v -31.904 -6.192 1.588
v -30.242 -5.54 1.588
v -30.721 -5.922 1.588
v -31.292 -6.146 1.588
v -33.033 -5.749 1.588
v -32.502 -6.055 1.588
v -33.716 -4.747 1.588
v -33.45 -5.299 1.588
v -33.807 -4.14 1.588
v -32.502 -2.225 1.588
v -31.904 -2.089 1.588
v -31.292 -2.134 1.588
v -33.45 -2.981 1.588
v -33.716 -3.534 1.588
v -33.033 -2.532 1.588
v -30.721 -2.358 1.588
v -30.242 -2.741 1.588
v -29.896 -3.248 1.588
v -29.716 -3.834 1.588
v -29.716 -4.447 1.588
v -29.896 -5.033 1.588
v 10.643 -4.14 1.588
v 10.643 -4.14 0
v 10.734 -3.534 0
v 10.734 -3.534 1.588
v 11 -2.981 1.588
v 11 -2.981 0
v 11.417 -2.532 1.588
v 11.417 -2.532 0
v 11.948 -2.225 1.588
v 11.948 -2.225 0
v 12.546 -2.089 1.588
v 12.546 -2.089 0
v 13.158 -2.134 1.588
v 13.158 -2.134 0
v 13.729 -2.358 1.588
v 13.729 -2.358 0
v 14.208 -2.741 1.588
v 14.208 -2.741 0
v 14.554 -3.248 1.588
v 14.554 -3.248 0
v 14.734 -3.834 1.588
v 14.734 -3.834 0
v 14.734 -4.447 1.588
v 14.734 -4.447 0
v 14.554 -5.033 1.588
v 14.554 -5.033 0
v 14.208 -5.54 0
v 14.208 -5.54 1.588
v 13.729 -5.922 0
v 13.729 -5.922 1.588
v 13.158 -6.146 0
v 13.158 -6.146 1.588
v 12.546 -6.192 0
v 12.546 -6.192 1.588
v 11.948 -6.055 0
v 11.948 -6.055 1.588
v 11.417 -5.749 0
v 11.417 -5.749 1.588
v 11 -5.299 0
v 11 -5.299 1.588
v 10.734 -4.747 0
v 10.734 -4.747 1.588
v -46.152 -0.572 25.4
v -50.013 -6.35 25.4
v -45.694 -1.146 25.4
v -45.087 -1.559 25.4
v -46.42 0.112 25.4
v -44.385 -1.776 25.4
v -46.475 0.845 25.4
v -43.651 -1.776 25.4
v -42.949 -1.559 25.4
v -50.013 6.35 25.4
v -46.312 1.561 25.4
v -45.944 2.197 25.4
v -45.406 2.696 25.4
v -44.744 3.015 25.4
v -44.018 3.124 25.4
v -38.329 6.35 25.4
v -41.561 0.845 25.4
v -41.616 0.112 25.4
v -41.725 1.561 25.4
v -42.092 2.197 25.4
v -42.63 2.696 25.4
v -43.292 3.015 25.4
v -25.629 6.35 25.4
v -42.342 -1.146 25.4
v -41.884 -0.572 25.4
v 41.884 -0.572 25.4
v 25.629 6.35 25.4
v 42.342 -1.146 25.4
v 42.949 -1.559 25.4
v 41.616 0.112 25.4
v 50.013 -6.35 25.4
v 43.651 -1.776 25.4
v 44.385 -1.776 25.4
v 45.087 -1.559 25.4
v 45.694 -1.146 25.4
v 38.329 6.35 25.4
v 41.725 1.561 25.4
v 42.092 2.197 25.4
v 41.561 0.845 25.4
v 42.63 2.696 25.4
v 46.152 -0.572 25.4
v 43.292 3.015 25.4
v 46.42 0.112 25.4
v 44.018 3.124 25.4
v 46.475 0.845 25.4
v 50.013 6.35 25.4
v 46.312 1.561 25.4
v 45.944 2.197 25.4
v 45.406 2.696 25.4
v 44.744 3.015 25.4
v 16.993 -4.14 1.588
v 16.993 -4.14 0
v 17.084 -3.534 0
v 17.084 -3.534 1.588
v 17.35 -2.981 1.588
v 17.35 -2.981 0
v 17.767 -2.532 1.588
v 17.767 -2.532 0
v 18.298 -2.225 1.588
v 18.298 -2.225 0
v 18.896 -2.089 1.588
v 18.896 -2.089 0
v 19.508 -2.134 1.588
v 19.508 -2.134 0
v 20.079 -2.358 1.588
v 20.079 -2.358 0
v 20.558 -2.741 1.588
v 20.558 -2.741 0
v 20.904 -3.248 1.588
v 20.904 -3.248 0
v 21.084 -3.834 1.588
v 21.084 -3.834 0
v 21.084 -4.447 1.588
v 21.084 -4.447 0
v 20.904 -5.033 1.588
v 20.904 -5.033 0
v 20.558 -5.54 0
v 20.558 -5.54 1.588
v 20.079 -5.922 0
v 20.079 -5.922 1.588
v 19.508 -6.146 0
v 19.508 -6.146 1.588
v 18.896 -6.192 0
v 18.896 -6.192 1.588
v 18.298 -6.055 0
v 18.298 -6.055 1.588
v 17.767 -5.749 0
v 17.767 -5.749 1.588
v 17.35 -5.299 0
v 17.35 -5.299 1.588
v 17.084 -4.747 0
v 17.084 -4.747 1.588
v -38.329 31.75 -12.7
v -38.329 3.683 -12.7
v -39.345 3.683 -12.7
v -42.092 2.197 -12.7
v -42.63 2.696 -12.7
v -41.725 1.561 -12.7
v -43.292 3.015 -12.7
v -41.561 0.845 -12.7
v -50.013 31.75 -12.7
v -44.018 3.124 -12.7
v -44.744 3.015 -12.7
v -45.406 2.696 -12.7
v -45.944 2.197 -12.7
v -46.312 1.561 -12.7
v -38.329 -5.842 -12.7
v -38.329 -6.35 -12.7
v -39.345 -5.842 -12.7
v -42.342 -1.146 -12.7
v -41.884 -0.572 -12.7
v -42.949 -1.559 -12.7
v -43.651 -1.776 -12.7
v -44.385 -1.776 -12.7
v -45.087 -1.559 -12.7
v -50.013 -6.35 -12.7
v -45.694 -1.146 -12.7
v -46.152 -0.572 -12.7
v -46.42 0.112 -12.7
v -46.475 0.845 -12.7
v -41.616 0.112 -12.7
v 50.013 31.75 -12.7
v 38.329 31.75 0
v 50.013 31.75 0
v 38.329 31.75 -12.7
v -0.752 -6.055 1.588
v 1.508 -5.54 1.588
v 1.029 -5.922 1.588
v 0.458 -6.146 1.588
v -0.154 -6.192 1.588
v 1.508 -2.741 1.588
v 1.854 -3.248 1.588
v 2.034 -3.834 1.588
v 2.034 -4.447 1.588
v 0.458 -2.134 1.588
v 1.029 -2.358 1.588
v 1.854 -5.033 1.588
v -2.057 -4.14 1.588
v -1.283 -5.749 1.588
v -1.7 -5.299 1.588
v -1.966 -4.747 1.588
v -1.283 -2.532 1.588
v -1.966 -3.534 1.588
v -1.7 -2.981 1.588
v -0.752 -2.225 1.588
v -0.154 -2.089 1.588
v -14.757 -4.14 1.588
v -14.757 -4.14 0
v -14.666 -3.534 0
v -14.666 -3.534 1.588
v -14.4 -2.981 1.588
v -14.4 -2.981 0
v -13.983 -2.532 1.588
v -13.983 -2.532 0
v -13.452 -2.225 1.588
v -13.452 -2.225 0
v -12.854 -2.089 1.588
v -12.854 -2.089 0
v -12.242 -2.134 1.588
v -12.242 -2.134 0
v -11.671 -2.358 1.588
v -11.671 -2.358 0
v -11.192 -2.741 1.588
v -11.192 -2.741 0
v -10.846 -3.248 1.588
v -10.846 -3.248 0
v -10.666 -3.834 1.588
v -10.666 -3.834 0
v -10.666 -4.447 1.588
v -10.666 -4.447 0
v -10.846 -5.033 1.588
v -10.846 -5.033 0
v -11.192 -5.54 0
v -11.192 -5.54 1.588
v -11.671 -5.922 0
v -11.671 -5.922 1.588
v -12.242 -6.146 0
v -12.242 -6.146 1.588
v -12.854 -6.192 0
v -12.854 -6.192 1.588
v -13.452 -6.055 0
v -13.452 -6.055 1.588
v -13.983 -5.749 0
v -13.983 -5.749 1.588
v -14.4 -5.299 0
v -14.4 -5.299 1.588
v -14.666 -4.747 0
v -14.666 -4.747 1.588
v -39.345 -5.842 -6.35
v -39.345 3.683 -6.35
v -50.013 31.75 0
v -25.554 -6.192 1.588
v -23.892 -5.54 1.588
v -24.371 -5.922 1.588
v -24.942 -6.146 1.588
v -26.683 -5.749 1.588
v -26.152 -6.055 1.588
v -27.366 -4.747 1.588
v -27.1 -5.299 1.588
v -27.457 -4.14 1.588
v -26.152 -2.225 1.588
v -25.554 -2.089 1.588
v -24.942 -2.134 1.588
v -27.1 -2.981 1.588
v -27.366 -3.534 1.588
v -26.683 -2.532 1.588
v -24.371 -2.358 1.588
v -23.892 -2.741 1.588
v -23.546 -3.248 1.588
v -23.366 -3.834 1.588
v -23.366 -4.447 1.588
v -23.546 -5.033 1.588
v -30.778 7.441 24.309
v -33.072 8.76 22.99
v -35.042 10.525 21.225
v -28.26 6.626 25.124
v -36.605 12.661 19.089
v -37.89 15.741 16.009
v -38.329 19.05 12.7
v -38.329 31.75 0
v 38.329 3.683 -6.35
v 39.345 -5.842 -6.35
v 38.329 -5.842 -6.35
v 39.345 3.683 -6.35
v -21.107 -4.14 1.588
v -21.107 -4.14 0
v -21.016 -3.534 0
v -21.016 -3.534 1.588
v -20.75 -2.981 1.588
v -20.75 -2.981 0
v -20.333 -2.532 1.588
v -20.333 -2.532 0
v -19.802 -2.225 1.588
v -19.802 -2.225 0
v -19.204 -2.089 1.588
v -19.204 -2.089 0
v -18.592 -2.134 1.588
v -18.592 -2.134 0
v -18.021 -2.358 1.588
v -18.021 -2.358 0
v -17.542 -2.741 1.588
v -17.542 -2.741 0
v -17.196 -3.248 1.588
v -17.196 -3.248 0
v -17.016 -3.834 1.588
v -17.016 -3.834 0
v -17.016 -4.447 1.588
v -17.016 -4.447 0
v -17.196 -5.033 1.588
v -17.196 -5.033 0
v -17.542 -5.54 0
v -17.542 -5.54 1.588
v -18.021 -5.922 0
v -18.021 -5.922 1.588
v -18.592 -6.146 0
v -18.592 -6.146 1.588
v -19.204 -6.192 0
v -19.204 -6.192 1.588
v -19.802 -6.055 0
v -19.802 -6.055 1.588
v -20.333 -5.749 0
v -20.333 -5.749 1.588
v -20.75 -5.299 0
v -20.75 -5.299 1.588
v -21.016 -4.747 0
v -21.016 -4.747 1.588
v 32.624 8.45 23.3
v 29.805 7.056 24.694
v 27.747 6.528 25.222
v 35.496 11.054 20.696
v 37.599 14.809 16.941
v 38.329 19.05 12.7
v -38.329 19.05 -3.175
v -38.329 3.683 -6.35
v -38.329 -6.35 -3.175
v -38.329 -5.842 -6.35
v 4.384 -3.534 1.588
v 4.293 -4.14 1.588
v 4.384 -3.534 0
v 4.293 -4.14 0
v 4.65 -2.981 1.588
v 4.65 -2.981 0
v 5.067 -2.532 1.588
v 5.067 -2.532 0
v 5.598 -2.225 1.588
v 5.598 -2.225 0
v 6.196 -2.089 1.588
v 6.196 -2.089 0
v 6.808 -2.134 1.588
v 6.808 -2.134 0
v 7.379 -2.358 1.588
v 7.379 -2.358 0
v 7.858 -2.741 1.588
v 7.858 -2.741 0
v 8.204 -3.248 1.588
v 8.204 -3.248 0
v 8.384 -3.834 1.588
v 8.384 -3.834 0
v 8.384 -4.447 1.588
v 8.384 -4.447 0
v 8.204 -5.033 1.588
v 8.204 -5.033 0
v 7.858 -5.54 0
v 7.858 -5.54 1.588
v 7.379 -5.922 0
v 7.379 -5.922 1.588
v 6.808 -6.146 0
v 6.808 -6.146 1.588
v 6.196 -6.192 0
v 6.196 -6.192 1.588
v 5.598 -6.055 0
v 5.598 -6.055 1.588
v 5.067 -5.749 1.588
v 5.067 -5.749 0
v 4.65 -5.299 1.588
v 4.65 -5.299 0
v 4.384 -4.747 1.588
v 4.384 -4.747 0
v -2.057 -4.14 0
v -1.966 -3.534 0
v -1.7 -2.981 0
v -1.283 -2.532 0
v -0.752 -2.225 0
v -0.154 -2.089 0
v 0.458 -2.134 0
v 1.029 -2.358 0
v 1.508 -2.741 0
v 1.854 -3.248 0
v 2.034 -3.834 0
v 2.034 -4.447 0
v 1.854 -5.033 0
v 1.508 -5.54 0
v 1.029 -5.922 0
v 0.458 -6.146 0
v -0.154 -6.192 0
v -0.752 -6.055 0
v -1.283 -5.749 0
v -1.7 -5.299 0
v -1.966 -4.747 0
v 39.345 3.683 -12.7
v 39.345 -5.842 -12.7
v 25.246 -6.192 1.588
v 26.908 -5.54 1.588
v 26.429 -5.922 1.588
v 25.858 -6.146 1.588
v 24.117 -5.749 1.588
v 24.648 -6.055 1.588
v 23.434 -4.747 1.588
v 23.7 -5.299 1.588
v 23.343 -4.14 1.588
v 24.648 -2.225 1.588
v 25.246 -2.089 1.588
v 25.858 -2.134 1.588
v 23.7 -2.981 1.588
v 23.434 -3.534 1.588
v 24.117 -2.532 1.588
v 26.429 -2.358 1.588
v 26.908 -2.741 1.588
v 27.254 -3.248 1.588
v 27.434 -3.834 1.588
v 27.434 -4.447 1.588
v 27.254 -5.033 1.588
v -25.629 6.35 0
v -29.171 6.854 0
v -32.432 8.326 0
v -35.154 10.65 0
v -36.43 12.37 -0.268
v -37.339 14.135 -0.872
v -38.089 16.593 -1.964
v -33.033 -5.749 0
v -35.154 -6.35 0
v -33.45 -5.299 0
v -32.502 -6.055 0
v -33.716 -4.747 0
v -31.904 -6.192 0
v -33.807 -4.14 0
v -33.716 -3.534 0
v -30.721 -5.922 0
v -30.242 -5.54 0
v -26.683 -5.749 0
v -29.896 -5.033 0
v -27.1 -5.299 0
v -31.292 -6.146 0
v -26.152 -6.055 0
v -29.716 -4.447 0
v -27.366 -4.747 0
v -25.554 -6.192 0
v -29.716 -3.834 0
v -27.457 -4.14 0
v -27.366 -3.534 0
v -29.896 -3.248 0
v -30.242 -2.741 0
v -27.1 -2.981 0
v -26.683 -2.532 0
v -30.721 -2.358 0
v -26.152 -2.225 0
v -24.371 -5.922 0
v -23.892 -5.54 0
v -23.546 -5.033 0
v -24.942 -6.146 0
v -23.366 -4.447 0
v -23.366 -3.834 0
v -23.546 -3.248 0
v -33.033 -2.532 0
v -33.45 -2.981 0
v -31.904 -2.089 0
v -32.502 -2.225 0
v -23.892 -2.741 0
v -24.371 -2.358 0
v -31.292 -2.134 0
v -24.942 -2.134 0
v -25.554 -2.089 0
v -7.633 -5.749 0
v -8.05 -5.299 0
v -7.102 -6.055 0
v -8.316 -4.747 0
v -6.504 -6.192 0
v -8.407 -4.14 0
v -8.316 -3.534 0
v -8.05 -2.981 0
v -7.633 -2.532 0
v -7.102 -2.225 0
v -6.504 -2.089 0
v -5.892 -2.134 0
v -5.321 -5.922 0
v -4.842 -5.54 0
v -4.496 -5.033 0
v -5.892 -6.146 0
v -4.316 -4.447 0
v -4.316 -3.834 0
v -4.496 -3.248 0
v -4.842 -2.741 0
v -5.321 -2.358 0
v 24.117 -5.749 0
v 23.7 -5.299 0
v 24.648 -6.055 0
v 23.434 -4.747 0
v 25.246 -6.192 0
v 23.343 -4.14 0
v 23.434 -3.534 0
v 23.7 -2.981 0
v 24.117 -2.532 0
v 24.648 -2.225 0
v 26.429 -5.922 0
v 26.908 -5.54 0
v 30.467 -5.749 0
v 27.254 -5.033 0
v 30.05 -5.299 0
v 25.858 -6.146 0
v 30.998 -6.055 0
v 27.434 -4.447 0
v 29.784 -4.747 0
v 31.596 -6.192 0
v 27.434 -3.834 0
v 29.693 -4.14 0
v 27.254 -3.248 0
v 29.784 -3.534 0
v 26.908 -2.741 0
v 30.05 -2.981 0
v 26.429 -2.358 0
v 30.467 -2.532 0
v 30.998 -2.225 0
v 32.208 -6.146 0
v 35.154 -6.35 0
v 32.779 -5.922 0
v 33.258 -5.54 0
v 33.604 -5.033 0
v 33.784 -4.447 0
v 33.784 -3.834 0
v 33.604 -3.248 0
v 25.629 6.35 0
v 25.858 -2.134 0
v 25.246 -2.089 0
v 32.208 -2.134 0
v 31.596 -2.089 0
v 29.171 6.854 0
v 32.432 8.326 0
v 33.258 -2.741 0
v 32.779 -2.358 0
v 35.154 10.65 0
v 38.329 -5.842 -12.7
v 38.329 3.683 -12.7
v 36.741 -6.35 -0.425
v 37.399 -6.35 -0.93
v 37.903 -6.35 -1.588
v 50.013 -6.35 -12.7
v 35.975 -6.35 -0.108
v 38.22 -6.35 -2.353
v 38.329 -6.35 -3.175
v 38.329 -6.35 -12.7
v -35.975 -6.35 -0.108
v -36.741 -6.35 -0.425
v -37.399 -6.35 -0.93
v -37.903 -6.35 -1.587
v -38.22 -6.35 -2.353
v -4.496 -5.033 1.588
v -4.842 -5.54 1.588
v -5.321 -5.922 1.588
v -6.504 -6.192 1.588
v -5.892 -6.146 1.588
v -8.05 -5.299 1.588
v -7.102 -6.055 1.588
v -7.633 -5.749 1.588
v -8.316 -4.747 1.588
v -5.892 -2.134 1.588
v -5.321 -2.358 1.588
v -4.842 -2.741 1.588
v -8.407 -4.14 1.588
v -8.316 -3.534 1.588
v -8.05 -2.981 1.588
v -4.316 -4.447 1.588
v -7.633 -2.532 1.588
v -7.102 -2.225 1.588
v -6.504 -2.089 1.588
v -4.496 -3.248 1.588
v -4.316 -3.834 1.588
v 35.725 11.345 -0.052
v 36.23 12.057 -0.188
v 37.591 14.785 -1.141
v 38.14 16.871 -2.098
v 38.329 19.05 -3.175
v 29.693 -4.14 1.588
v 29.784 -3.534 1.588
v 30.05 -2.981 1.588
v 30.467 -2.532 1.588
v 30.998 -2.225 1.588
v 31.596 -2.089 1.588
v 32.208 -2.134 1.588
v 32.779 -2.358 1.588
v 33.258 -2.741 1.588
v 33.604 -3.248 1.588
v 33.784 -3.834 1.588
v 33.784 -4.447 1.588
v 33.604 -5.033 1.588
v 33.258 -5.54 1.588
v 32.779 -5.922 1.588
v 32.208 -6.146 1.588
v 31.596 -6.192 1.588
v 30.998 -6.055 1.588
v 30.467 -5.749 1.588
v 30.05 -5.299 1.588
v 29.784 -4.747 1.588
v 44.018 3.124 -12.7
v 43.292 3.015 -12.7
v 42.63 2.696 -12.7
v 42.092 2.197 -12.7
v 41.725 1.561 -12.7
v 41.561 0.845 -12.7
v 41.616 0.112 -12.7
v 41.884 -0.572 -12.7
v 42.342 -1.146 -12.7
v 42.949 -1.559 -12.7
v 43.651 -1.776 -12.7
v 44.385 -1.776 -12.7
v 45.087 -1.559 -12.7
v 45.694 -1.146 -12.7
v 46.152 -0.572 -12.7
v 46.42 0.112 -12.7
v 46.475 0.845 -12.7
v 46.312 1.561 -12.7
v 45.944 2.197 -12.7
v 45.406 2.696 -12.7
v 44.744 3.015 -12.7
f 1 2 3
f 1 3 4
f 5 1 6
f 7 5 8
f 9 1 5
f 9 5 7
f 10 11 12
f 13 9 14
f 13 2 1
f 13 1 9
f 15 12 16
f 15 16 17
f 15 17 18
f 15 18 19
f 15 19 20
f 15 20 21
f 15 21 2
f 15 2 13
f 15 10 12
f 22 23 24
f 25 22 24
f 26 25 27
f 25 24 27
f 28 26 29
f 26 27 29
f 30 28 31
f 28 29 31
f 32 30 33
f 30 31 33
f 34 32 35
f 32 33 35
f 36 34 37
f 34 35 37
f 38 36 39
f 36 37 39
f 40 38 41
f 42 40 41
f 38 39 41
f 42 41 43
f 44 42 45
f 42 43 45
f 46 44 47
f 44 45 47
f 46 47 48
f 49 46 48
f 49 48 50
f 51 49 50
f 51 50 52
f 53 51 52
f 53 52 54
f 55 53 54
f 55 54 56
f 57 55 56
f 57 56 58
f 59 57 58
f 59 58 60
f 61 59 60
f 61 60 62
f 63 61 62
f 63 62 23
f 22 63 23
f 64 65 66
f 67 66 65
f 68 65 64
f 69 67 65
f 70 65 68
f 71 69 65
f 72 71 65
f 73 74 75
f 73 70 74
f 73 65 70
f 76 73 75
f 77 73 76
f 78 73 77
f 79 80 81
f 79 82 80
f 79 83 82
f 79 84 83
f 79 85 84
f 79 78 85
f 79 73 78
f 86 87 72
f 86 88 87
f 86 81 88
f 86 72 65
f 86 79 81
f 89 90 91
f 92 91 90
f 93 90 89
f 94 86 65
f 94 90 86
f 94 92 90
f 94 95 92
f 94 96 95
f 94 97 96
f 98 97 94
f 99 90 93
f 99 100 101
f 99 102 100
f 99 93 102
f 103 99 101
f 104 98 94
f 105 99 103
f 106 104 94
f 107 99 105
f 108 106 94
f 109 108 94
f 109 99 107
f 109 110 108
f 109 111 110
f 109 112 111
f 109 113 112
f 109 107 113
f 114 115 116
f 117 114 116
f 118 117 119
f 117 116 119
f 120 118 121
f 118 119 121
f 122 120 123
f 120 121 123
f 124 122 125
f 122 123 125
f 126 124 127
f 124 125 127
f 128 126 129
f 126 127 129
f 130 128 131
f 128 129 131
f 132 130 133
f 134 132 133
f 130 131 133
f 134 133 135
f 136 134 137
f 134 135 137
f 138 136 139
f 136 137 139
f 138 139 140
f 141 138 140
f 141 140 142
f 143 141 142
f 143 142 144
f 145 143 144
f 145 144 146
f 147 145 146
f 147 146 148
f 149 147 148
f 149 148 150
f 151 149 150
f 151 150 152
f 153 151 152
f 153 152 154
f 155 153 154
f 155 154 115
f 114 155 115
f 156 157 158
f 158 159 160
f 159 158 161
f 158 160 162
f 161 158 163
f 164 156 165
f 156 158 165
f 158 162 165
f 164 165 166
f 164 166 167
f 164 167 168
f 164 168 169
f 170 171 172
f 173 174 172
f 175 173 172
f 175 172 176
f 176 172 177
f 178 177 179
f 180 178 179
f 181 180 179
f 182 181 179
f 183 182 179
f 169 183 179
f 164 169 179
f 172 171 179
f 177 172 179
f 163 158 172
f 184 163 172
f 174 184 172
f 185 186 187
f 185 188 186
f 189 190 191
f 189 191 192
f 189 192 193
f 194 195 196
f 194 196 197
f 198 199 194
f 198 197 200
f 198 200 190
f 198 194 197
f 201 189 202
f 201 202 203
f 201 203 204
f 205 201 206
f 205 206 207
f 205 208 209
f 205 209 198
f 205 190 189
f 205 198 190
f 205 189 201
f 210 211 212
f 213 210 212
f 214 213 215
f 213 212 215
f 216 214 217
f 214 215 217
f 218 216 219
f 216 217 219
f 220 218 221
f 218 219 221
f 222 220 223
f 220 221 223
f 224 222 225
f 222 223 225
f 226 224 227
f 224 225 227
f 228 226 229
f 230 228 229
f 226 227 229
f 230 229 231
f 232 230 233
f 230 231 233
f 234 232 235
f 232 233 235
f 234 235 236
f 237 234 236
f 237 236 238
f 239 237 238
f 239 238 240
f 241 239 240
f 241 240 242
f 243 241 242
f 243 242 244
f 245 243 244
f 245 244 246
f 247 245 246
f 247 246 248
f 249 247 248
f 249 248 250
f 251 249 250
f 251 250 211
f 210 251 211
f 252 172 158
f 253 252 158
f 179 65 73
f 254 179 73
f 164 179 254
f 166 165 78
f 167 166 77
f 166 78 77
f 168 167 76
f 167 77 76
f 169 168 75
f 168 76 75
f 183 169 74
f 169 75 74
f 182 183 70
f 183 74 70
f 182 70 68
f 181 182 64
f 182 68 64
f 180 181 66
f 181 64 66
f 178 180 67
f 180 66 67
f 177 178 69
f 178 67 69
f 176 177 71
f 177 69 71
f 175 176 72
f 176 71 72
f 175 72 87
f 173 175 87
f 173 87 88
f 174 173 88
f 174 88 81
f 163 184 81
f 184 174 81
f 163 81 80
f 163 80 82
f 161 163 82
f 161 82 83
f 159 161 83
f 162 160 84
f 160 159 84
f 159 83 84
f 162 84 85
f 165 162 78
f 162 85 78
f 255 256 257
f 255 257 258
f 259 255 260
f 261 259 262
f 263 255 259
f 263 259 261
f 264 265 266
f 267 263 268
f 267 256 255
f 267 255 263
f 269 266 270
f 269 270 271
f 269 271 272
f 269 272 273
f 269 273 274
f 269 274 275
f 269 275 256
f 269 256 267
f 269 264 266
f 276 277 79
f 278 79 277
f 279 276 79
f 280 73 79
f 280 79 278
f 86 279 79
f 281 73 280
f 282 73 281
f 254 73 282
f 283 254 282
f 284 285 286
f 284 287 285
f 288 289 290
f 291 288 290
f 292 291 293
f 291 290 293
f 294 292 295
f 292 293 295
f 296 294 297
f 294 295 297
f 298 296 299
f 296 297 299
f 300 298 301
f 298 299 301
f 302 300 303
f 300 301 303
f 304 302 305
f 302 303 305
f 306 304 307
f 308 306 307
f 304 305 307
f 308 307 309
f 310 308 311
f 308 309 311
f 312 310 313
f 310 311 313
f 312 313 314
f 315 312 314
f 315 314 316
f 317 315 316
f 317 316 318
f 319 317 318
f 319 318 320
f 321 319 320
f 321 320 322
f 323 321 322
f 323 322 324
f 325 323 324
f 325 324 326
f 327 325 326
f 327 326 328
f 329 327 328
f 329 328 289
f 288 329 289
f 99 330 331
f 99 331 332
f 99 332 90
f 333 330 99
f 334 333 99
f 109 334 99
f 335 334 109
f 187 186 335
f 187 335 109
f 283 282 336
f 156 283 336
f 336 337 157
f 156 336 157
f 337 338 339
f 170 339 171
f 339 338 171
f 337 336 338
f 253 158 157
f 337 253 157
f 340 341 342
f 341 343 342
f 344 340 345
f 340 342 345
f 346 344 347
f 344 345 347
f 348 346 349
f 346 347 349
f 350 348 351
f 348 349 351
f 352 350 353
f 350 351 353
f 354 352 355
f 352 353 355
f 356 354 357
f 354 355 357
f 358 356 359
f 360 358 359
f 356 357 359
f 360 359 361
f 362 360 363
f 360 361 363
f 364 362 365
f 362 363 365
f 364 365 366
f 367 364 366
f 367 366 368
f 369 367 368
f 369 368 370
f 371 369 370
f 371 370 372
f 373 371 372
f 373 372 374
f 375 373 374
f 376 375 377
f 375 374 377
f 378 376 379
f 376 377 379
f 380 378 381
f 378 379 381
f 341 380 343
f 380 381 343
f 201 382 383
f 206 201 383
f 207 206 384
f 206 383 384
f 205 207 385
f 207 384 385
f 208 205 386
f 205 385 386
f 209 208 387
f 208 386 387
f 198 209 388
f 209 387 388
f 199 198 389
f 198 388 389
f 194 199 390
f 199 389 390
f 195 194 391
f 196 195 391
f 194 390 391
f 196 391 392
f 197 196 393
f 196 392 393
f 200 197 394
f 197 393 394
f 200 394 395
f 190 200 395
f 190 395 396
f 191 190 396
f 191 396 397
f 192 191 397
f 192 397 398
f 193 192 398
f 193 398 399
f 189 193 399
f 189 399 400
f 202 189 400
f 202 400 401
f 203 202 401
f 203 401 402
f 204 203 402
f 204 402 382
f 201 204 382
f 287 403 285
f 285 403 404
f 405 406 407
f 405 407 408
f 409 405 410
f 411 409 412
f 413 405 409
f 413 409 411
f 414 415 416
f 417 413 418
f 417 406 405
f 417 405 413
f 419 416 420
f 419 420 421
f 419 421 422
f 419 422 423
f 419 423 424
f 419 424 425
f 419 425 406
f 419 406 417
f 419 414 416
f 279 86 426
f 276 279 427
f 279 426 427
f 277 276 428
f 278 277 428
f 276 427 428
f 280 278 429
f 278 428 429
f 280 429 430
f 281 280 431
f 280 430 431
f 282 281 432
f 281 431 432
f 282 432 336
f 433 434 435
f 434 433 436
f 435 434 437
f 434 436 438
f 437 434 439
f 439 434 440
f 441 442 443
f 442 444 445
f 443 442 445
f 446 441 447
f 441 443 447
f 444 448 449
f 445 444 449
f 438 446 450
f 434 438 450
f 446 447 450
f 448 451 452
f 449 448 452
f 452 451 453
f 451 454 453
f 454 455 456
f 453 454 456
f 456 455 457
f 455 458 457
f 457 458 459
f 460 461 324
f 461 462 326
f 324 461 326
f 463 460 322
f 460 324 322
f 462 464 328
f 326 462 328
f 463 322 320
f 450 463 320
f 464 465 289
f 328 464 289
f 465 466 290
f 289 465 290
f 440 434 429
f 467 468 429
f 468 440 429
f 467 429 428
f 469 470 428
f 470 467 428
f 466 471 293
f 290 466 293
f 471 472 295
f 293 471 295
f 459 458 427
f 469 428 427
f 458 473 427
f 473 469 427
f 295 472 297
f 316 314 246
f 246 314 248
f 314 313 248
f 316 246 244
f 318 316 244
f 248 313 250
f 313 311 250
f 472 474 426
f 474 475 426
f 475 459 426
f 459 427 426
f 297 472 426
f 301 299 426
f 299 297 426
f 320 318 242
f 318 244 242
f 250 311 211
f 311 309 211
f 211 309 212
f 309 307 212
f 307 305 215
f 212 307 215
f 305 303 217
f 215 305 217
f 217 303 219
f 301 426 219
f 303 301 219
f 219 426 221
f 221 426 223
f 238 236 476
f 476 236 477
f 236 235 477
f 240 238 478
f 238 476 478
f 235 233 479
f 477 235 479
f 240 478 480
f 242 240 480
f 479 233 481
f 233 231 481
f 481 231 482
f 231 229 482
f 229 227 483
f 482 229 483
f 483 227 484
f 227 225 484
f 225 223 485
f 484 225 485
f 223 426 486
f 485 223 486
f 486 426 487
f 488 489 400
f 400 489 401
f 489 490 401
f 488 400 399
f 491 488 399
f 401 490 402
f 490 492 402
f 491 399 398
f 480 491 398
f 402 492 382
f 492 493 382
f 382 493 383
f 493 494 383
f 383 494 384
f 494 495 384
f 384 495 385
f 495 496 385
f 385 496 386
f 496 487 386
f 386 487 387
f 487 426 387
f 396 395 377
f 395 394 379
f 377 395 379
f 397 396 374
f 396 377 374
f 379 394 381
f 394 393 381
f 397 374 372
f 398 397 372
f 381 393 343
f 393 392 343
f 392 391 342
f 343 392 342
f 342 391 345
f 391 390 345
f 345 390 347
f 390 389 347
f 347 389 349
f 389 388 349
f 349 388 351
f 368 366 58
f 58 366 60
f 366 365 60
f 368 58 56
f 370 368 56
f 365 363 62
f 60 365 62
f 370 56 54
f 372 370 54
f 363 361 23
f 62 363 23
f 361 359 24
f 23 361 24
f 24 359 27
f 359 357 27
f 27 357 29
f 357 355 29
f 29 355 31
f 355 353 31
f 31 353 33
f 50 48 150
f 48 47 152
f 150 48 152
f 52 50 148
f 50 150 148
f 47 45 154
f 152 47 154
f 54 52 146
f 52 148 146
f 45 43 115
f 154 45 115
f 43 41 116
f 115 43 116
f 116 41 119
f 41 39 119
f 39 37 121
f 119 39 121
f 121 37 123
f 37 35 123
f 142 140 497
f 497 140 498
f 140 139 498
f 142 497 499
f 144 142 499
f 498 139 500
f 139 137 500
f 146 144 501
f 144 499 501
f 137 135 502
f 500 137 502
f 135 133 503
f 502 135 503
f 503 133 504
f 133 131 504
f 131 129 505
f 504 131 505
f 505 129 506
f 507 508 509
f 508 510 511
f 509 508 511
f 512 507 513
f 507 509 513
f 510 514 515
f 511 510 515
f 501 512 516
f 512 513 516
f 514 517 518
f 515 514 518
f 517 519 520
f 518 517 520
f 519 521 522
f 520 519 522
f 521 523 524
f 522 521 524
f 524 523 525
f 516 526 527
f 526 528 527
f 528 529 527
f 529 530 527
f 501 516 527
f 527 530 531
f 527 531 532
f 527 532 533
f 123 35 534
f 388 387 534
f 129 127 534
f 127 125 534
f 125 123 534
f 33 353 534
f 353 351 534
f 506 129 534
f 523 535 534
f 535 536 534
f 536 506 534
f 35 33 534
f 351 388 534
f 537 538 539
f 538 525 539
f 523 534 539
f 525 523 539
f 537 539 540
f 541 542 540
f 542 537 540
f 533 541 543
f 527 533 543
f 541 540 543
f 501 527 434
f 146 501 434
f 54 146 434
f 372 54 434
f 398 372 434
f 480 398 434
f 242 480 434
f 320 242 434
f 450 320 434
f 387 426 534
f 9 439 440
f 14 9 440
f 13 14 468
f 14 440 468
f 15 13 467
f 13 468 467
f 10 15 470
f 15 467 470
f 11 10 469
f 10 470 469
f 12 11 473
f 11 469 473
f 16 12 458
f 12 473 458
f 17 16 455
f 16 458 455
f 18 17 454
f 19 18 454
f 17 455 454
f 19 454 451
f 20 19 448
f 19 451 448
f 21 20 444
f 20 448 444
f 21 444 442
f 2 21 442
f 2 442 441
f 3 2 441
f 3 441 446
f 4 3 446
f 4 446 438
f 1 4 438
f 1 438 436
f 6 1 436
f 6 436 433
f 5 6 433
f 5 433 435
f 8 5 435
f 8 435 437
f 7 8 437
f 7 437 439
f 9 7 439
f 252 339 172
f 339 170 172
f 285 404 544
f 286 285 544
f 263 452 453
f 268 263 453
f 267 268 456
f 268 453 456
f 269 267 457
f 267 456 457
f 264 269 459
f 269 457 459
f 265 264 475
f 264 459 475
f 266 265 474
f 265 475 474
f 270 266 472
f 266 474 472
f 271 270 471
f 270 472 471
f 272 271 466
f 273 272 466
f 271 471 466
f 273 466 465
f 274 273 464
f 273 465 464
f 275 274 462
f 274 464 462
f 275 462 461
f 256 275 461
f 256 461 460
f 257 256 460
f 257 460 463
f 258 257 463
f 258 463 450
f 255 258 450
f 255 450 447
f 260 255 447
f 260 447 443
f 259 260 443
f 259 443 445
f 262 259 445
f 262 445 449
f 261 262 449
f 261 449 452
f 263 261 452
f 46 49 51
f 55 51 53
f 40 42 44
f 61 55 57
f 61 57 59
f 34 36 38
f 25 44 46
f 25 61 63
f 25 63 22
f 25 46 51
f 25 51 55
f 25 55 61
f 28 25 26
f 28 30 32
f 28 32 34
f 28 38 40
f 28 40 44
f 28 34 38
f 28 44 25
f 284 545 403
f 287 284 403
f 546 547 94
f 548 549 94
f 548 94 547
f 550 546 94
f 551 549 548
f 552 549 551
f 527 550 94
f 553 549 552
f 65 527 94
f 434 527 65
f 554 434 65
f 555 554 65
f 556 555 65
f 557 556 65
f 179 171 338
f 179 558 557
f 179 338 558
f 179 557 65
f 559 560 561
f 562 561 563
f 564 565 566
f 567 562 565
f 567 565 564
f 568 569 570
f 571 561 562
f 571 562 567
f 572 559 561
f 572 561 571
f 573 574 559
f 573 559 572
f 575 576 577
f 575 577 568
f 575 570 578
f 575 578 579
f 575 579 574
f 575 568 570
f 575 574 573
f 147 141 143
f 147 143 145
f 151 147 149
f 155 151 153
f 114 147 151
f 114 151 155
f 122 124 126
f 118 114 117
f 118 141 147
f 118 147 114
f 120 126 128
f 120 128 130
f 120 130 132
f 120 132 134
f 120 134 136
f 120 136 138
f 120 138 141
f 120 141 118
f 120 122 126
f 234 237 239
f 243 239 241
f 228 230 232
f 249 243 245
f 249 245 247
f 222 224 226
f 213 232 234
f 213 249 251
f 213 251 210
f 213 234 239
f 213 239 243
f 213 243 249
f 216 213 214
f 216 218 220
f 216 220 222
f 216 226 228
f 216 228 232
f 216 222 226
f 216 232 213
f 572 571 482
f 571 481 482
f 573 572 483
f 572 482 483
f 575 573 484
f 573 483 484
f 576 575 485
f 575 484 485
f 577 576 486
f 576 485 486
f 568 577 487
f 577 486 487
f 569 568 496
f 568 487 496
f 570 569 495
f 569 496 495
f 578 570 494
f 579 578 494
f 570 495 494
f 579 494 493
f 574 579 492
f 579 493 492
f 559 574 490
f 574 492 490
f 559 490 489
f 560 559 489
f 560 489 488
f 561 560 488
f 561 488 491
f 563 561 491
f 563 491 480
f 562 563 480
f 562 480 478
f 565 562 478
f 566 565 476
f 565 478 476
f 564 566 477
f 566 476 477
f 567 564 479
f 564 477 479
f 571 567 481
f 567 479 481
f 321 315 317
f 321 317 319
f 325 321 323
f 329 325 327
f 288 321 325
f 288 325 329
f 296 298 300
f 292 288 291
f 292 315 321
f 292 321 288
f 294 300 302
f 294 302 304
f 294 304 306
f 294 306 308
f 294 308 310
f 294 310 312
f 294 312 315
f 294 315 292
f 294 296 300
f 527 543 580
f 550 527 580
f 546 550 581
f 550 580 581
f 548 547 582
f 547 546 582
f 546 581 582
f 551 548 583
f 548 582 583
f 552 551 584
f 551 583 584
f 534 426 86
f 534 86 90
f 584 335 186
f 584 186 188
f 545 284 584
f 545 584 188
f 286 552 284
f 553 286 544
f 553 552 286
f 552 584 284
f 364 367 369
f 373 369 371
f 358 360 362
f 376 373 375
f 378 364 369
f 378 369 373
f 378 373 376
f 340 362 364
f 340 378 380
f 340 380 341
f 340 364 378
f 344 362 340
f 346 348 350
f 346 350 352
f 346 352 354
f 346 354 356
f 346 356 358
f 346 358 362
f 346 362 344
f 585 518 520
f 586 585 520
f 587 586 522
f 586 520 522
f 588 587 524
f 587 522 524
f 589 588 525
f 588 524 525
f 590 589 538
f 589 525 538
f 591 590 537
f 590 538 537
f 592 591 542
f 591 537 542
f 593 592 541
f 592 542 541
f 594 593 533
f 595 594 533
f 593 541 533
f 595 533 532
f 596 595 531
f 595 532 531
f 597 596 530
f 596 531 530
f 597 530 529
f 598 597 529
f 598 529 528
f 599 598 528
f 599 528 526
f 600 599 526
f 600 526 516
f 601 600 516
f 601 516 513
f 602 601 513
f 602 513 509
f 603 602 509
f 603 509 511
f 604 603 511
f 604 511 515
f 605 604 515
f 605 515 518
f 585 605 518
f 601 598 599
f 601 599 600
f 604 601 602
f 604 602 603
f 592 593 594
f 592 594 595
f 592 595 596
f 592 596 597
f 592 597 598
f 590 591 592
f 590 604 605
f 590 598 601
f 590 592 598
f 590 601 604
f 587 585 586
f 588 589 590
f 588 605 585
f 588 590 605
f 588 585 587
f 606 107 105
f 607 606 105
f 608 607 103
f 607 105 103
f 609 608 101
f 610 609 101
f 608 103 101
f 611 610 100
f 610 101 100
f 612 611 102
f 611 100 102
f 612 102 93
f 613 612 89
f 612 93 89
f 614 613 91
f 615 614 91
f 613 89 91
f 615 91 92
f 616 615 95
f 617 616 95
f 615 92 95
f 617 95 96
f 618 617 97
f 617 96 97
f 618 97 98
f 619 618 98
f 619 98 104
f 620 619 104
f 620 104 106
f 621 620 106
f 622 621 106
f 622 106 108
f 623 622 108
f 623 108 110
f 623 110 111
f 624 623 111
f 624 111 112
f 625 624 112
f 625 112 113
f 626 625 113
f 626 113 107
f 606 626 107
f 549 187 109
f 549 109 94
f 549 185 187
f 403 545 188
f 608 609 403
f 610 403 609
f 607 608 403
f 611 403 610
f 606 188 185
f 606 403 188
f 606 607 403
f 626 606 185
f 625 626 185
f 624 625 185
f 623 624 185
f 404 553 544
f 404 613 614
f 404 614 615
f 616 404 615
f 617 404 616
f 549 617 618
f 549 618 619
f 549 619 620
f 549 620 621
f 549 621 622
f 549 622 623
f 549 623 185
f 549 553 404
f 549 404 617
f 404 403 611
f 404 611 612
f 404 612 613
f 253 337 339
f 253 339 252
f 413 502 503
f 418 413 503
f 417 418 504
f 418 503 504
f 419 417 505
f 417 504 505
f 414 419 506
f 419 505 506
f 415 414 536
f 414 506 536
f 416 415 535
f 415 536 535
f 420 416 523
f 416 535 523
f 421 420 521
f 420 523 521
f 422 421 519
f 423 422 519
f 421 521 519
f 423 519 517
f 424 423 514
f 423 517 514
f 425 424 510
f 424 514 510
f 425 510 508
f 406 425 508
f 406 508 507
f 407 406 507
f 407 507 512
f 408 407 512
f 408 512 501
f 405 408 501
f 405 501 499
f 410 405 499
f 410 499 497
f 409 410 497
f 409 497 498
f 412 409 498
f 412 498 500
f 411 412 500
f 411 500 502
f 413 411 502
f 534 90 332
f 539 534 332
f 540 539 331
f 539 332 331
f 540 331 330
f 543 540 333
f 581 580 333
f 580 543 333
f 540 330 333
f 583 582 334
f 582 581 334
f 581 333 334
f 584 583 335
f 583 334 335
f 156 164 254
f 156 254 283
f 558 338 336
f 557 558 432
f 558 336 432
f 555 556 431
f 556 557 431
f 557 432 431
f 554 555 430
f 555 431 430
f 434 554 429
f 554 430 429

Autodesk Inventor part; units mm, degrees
ref_plane "YZ Plane" through (0, 0, 0) normal (1, 0, 0) x (0, 1, 0)
ref_plane "XZ Plane" through (0, 0, 0) normal (0, 1, 0) x (-1, 0, 0)
ref_plane "XY Plane" through (0, 0, 0) normal (0, 0, 1) x (1, 0, 0)
sketch "Sketch1" plane through (0, 0, 0) normal (0, 0, 1) x (1, 0, 0)
  line L0 (-50.0126, 6.35) -> (50.0126, 6.35)
  line L1 (50.0126, 6.35) -> (50.0126, -6.35)
  line L2 (50.0126, -6.35) -> (-50.0126, -6.35)
  line L3 (-50.0126, -6.35) -> (-50.0126, 6.35)
  line L4 (-50.0126, 6.35) -> (50.0126, -6.35) construction
  line L5 (50.0126, 6.35) -> (-50.0126, -6.35) construction
  point P0 (0, 0)
  dimension "d0" = 100.0252
  dimension "d1" = 12.7
extrude "Extrusion1" add sketch "Sketch1" along normal blind 25.4
sketch "Sketch2" plane through (0, 0, 0) normal (0, 0, 1) x (1, 0, 0)
  line L0 (-50.0126, -6.35) -> (50.0126, -6.35) projected
  line L1 (-50.0126, 6.35) -> (-50.0126, -6.35) projected
  line L2 (50.0126, 6.35) -> (-50.0126, 6.35) projected
  line L3 (50.0126, -6.35) -> (50.0126, 6.35) projected
  line L4 (-70.0176, 0) -> (70.0176, 0) projected
  line L5 (0, -8.89) -> (0, 8.89) projected
  line L6 (50.0126, -6.35) -> (50.0126, 6.35) projected
  line L7 (-50.0126, -6.35) -> (50.0126, -6.35) projected
  line L8 (50.0126, 6.35) -> (38.3286, 6.35)
  line L9 (38.3286, 6.35) -> (38.3286, -6.35)
  line L10 (38.3286, -6.35) -> (50.0126, -6.35)
  line L11 (50.0126, -6.35) -> (50.0126, 6.35)
  point P0 (0, 0)
  point P1 (38.3286, 6.35)
  point P2 (38.3286, -6.35)
  dimension "d4" = 11.684
extrude "Extrusion2" add sketch "Sketch2" against normal blind 12.7 contours L9 L4 L3 L0 | L9 L2 L3 L4
mirror "Mirror1" about plane through (0, 0, 0) normal (1, 0, 0) of "Extrusion2"
fillet "Fillet1" radius 3.175 2 edges at (38.3286, 0, 0) (-38.3286, 0, 0)
sketch "Sketch3" plane through (0, 0, 0) normal (0, 0, -1) x (-1, 0, 0)
  line L0 (70.0176, 0) -> (-70.0176, 0) projected
  line L1 (0, -8.89) -> (0, 8.89) projected
  line L2 (35.1536, 6.35) -> (35.1536, -6.35) projected
  line L3 (-35.1536, 6.35) -> (35.1536, 6.35) projected
  line L4 (-35.1536, -6.35) -> (-35.1536, 6.35) projected
  line L5 (35.1536, -6.35) -> (-35.1536, -6.35) projected
  circle A0 centre (0, -4.1402) radius 2.0574
  point P0 (0, 0)
  dimension "d9" = 4.1148
  dimension "d10" = 2.2098
extrude "Extrusion3" cut sketch "Sketch3" against normal blind 1.5875 contours A0 L1 | L1 A0
pattern_linear "Rectangular Pattern1" count 11 spacing 6.35 along (1, 0, 0) of "Extrusion3" first direction both ways yes
sketch "Sketch4" plane through (0, 0, -12.7) normal (0, 0, -1) x (-1, 0, 0)
  line L0 (70.0176, 0) -> (-70.0176, 0) projected
  line L1 (0, -8.89) -> (0, 8.89) projected
  line L2 (-50.0126, -6.35) -> (-38.3286, -6.35) projected
  line L3 (-38.3286, -6.35) -> (-38.3286, 6.35) projected
  line L4 (-38.3286, 6.35) -> (-50.0126, 6.35) projected
  line L5 (-50.0126, 6.35) -> (-50.0126, -6.35) projected
  line L6 (50.0126, -6.35) -> (38.3286, -6.35) projected
  line L7 (50.0126, 6.35) -> (50.0126, -6.35) projected
  line L8 (38.3286, 6.35) -> (50.0126, 6.35) projected
  line L9 (38.3286, -6.35) -> (38.3286, 6.35) projected
  line L10 (-38.3286, -6.35) -> (-38.3286, 6.35) projected
  line L11 (-38.3286, 3.683) -> (-39.3446, 3.683)
  line L12 (-39.3446, 3.683) -> (-39.3446, -5.842)
  line L13 (-39.3446, -5.842) -> (-38.3286, -5.842)
  line L14 (-38.3286, -5.842) -> (-38.3286, 3.683)
  point P0 (0, 0)
  point P1 (-38.3286, 3.683)
  dimension "d19" = 1.016
  dimension "d20" = 9.525
  dimension "d21" = 0.508
extrude "Extrusion4" cut sketch "Sketch4" against normal blind 6.35 contours L3 L13 L12 L0 | L0 L12 L11 L3
mirror "Mirror2" about plane through (0, 0, 0) normal (1, 0, 0) of "Extrusion4"
sketch "Sketch5" plane through (0, 0, -12.7) normal (0, 0, -1) x (-1, 0, 0)
  line L0 (-38.3286, -5.842) -> (-39.3446, -5.842) projected
  line L1 (-39.3446, -5.842) -> (-39.3446, 3.683) projected
  line L2 (-39.3446, 3.683) -> (-38.3286, 3.683) projected
  line L3 (-38.3286, 3.683) -> (-38.3286, 6.35) projected
  line L4 (-38.3286, 6.35) -> (-50.0126, 6.35) projected
  line L5 (-50.0126, 6.35) -> (-50.0126, -6.35) projected
  line L6 (-50.0126, -6.35) -> (-38.3286, -6.35) projected
  line L7 (-38.3286, -6.35) -> (-38.3286, -5.842) projected
  line L8 (47.9806, -6.35) -> (47.9806, 6.35) projected
  line L9 (50.0126, 6.35) -> (50.0126, -6.35) projected
  line L10 (38.3286, 3.683) -> (39.3446, 3.683) projected
  line L11 (39.3446, 3.683) -> (39.3446, -5.842) projected
  line L12 (39.3446, -5.842) -> (38.3286, -5.842) projected
  line L13 (38.3286, -6.35) -> (38.3286, -5.842) projected
  line L14 (50.0126, -6.35) -> (38.3286, -6.35) projected
  line L15 (50.0126, 6.35) -> (50.0126, -6.35) projected
  line L16 (38.3286, 6.35) -> (50.0126, 6.35) projected
  line L17 (38.3286, 3.683) -> (38.3286, 6.35) projected
  line L18 (70.0176, 0) -> (-70.0176, 0) projected
  line L19 (0, -8.89) -> (0, 8.89) projected
  circle A0 centre (-44.0182, 0.6604) radius 3.3782
  point P0 (0, 0)
  dimension "d24" = 6.7564
  dimension "d25" = 7.0104
  dimension "d26" = 5.9944
hole "Hole1" at (44.0182, 0.6604, -12.7) direction (0, 0, 1) diameter 4.9276 end through all clearance for "Socket Head Cap Screw" size "#8" standard "Ansi Unified Screw Threads"
mirror "Mirror3" about plane through (0, 0, 0) normal (1, 0, 0) of "Hole1"
sketch "Sketch6" plane through (38.3286, 6.35, -12.7) normal (0, 1, 0) x (1, 0, 0)
  line L0 (11.684, -38.1) -> (-88.3412, -38.1) projected
  line L1 (11.684, 0) -> (11.684, -38.1) projected
  line L2 (0, 0) -> (11.684, 0) projected
  line L3 (0, -9.525) -> (0, 0) projected
  arc A0 (-3.175, -12.7) -> (0, -9.525) centre (-3.175, -9.525) ccw projected
  line L4 (-3.175, -12.7) -> (-73.4822, -12.7) projected
  arc A1 (-76.6572, -9.525) -> (-73.4822, -12.7) centre (-73.4822, -9.525) ccw projected
  line L5 (-76.6572, -9.525) -> (-76.6572, 0) projected
  line L6 (-76.6572, 0) -> (-88.3412, 0) projected
  line L7 (-88.3412, 0) -> (-88.3412, -38.1) projected
  line L8 (-108.397, -12.7) -> (31.9938, -12.7) projected
  line L9 (-38.3286, 7.62) -> (-38.3286, -45.72) projected
  line L10 (0, -9.525) -> (0, 0) projected
  line L11 (0, 0) -> (11.684, 0)
  line L12 (11.684, 0) -> (11.684, -38.1)
  line L13 (11.684, -38.1) -> (0, -38.1)
  line L14 (0, -38.1) -> (0, 0)
  line L15 (-88.3412, 0) -> (-88.3412, -38.1)
  line L16 (-76.6572, 0) -> (-88.3412, 0)
  line L17 (-76.6572, -9.525) -> (-76.6572, 0)
  arc A2 (-76.6572, -9.525) -> (-73.4822, -12.7) centre (-73.4822, -9.525) ccw
  line L18 (-76.6572, -9.525) -> (-76.6572, 0)
  line L19 (-76.6572, 0) -> (-88.3412, 0)
  line L20 (-88.3412, 0) -> (-88.3412, -38.1)
  line L21 (-88.3412, -38.1) -> (-76.6572, -38.1)
  line L22 (-76.6572, -38.1) -> (-76.6572, 0)
  point P0 (-38.3286, -12.7)
extrude "Extrusion5" add sketch "Sketch6" along normal blind 25.4 contours L0 L14 L8 L1 | L8 L14 L3 L2 L1 | L0 L7 L8 L22 | L8 L7 L6 L5 L22
chamfer "Chamfer2" distance 25.4 angle 45 2 edges at (44.1706, 31.75, 25.4) (-44.1706, 31.75, 25.4)
fillet "Fillet3" radius 12.7 2 edges at (38.3286, 6.35, 11.1125) (-38.3286, 6.35, 11.1125)
equation "\"d32\" = Thickness"
equation "\"BendRadius\" = Thickness"
equation "\"BendReliefWidth\" = Thickness"
equation "\"BendReliefDepth\" = 0.5 * Thickness"
equation "\"CornerReliefSize\" = 4 * Thickness"
equation "\"MinimumRemnant\" = 2 * Thickness"
equation "\"TransitionRadius\" = BendRadius"
equation "\"JacobiRadiusSize\" = BendRadius"
equation "\"GapSize\" = Thickness"
equation "\"Thickness\" = 3.048"
properties part number "_3DPrint"
